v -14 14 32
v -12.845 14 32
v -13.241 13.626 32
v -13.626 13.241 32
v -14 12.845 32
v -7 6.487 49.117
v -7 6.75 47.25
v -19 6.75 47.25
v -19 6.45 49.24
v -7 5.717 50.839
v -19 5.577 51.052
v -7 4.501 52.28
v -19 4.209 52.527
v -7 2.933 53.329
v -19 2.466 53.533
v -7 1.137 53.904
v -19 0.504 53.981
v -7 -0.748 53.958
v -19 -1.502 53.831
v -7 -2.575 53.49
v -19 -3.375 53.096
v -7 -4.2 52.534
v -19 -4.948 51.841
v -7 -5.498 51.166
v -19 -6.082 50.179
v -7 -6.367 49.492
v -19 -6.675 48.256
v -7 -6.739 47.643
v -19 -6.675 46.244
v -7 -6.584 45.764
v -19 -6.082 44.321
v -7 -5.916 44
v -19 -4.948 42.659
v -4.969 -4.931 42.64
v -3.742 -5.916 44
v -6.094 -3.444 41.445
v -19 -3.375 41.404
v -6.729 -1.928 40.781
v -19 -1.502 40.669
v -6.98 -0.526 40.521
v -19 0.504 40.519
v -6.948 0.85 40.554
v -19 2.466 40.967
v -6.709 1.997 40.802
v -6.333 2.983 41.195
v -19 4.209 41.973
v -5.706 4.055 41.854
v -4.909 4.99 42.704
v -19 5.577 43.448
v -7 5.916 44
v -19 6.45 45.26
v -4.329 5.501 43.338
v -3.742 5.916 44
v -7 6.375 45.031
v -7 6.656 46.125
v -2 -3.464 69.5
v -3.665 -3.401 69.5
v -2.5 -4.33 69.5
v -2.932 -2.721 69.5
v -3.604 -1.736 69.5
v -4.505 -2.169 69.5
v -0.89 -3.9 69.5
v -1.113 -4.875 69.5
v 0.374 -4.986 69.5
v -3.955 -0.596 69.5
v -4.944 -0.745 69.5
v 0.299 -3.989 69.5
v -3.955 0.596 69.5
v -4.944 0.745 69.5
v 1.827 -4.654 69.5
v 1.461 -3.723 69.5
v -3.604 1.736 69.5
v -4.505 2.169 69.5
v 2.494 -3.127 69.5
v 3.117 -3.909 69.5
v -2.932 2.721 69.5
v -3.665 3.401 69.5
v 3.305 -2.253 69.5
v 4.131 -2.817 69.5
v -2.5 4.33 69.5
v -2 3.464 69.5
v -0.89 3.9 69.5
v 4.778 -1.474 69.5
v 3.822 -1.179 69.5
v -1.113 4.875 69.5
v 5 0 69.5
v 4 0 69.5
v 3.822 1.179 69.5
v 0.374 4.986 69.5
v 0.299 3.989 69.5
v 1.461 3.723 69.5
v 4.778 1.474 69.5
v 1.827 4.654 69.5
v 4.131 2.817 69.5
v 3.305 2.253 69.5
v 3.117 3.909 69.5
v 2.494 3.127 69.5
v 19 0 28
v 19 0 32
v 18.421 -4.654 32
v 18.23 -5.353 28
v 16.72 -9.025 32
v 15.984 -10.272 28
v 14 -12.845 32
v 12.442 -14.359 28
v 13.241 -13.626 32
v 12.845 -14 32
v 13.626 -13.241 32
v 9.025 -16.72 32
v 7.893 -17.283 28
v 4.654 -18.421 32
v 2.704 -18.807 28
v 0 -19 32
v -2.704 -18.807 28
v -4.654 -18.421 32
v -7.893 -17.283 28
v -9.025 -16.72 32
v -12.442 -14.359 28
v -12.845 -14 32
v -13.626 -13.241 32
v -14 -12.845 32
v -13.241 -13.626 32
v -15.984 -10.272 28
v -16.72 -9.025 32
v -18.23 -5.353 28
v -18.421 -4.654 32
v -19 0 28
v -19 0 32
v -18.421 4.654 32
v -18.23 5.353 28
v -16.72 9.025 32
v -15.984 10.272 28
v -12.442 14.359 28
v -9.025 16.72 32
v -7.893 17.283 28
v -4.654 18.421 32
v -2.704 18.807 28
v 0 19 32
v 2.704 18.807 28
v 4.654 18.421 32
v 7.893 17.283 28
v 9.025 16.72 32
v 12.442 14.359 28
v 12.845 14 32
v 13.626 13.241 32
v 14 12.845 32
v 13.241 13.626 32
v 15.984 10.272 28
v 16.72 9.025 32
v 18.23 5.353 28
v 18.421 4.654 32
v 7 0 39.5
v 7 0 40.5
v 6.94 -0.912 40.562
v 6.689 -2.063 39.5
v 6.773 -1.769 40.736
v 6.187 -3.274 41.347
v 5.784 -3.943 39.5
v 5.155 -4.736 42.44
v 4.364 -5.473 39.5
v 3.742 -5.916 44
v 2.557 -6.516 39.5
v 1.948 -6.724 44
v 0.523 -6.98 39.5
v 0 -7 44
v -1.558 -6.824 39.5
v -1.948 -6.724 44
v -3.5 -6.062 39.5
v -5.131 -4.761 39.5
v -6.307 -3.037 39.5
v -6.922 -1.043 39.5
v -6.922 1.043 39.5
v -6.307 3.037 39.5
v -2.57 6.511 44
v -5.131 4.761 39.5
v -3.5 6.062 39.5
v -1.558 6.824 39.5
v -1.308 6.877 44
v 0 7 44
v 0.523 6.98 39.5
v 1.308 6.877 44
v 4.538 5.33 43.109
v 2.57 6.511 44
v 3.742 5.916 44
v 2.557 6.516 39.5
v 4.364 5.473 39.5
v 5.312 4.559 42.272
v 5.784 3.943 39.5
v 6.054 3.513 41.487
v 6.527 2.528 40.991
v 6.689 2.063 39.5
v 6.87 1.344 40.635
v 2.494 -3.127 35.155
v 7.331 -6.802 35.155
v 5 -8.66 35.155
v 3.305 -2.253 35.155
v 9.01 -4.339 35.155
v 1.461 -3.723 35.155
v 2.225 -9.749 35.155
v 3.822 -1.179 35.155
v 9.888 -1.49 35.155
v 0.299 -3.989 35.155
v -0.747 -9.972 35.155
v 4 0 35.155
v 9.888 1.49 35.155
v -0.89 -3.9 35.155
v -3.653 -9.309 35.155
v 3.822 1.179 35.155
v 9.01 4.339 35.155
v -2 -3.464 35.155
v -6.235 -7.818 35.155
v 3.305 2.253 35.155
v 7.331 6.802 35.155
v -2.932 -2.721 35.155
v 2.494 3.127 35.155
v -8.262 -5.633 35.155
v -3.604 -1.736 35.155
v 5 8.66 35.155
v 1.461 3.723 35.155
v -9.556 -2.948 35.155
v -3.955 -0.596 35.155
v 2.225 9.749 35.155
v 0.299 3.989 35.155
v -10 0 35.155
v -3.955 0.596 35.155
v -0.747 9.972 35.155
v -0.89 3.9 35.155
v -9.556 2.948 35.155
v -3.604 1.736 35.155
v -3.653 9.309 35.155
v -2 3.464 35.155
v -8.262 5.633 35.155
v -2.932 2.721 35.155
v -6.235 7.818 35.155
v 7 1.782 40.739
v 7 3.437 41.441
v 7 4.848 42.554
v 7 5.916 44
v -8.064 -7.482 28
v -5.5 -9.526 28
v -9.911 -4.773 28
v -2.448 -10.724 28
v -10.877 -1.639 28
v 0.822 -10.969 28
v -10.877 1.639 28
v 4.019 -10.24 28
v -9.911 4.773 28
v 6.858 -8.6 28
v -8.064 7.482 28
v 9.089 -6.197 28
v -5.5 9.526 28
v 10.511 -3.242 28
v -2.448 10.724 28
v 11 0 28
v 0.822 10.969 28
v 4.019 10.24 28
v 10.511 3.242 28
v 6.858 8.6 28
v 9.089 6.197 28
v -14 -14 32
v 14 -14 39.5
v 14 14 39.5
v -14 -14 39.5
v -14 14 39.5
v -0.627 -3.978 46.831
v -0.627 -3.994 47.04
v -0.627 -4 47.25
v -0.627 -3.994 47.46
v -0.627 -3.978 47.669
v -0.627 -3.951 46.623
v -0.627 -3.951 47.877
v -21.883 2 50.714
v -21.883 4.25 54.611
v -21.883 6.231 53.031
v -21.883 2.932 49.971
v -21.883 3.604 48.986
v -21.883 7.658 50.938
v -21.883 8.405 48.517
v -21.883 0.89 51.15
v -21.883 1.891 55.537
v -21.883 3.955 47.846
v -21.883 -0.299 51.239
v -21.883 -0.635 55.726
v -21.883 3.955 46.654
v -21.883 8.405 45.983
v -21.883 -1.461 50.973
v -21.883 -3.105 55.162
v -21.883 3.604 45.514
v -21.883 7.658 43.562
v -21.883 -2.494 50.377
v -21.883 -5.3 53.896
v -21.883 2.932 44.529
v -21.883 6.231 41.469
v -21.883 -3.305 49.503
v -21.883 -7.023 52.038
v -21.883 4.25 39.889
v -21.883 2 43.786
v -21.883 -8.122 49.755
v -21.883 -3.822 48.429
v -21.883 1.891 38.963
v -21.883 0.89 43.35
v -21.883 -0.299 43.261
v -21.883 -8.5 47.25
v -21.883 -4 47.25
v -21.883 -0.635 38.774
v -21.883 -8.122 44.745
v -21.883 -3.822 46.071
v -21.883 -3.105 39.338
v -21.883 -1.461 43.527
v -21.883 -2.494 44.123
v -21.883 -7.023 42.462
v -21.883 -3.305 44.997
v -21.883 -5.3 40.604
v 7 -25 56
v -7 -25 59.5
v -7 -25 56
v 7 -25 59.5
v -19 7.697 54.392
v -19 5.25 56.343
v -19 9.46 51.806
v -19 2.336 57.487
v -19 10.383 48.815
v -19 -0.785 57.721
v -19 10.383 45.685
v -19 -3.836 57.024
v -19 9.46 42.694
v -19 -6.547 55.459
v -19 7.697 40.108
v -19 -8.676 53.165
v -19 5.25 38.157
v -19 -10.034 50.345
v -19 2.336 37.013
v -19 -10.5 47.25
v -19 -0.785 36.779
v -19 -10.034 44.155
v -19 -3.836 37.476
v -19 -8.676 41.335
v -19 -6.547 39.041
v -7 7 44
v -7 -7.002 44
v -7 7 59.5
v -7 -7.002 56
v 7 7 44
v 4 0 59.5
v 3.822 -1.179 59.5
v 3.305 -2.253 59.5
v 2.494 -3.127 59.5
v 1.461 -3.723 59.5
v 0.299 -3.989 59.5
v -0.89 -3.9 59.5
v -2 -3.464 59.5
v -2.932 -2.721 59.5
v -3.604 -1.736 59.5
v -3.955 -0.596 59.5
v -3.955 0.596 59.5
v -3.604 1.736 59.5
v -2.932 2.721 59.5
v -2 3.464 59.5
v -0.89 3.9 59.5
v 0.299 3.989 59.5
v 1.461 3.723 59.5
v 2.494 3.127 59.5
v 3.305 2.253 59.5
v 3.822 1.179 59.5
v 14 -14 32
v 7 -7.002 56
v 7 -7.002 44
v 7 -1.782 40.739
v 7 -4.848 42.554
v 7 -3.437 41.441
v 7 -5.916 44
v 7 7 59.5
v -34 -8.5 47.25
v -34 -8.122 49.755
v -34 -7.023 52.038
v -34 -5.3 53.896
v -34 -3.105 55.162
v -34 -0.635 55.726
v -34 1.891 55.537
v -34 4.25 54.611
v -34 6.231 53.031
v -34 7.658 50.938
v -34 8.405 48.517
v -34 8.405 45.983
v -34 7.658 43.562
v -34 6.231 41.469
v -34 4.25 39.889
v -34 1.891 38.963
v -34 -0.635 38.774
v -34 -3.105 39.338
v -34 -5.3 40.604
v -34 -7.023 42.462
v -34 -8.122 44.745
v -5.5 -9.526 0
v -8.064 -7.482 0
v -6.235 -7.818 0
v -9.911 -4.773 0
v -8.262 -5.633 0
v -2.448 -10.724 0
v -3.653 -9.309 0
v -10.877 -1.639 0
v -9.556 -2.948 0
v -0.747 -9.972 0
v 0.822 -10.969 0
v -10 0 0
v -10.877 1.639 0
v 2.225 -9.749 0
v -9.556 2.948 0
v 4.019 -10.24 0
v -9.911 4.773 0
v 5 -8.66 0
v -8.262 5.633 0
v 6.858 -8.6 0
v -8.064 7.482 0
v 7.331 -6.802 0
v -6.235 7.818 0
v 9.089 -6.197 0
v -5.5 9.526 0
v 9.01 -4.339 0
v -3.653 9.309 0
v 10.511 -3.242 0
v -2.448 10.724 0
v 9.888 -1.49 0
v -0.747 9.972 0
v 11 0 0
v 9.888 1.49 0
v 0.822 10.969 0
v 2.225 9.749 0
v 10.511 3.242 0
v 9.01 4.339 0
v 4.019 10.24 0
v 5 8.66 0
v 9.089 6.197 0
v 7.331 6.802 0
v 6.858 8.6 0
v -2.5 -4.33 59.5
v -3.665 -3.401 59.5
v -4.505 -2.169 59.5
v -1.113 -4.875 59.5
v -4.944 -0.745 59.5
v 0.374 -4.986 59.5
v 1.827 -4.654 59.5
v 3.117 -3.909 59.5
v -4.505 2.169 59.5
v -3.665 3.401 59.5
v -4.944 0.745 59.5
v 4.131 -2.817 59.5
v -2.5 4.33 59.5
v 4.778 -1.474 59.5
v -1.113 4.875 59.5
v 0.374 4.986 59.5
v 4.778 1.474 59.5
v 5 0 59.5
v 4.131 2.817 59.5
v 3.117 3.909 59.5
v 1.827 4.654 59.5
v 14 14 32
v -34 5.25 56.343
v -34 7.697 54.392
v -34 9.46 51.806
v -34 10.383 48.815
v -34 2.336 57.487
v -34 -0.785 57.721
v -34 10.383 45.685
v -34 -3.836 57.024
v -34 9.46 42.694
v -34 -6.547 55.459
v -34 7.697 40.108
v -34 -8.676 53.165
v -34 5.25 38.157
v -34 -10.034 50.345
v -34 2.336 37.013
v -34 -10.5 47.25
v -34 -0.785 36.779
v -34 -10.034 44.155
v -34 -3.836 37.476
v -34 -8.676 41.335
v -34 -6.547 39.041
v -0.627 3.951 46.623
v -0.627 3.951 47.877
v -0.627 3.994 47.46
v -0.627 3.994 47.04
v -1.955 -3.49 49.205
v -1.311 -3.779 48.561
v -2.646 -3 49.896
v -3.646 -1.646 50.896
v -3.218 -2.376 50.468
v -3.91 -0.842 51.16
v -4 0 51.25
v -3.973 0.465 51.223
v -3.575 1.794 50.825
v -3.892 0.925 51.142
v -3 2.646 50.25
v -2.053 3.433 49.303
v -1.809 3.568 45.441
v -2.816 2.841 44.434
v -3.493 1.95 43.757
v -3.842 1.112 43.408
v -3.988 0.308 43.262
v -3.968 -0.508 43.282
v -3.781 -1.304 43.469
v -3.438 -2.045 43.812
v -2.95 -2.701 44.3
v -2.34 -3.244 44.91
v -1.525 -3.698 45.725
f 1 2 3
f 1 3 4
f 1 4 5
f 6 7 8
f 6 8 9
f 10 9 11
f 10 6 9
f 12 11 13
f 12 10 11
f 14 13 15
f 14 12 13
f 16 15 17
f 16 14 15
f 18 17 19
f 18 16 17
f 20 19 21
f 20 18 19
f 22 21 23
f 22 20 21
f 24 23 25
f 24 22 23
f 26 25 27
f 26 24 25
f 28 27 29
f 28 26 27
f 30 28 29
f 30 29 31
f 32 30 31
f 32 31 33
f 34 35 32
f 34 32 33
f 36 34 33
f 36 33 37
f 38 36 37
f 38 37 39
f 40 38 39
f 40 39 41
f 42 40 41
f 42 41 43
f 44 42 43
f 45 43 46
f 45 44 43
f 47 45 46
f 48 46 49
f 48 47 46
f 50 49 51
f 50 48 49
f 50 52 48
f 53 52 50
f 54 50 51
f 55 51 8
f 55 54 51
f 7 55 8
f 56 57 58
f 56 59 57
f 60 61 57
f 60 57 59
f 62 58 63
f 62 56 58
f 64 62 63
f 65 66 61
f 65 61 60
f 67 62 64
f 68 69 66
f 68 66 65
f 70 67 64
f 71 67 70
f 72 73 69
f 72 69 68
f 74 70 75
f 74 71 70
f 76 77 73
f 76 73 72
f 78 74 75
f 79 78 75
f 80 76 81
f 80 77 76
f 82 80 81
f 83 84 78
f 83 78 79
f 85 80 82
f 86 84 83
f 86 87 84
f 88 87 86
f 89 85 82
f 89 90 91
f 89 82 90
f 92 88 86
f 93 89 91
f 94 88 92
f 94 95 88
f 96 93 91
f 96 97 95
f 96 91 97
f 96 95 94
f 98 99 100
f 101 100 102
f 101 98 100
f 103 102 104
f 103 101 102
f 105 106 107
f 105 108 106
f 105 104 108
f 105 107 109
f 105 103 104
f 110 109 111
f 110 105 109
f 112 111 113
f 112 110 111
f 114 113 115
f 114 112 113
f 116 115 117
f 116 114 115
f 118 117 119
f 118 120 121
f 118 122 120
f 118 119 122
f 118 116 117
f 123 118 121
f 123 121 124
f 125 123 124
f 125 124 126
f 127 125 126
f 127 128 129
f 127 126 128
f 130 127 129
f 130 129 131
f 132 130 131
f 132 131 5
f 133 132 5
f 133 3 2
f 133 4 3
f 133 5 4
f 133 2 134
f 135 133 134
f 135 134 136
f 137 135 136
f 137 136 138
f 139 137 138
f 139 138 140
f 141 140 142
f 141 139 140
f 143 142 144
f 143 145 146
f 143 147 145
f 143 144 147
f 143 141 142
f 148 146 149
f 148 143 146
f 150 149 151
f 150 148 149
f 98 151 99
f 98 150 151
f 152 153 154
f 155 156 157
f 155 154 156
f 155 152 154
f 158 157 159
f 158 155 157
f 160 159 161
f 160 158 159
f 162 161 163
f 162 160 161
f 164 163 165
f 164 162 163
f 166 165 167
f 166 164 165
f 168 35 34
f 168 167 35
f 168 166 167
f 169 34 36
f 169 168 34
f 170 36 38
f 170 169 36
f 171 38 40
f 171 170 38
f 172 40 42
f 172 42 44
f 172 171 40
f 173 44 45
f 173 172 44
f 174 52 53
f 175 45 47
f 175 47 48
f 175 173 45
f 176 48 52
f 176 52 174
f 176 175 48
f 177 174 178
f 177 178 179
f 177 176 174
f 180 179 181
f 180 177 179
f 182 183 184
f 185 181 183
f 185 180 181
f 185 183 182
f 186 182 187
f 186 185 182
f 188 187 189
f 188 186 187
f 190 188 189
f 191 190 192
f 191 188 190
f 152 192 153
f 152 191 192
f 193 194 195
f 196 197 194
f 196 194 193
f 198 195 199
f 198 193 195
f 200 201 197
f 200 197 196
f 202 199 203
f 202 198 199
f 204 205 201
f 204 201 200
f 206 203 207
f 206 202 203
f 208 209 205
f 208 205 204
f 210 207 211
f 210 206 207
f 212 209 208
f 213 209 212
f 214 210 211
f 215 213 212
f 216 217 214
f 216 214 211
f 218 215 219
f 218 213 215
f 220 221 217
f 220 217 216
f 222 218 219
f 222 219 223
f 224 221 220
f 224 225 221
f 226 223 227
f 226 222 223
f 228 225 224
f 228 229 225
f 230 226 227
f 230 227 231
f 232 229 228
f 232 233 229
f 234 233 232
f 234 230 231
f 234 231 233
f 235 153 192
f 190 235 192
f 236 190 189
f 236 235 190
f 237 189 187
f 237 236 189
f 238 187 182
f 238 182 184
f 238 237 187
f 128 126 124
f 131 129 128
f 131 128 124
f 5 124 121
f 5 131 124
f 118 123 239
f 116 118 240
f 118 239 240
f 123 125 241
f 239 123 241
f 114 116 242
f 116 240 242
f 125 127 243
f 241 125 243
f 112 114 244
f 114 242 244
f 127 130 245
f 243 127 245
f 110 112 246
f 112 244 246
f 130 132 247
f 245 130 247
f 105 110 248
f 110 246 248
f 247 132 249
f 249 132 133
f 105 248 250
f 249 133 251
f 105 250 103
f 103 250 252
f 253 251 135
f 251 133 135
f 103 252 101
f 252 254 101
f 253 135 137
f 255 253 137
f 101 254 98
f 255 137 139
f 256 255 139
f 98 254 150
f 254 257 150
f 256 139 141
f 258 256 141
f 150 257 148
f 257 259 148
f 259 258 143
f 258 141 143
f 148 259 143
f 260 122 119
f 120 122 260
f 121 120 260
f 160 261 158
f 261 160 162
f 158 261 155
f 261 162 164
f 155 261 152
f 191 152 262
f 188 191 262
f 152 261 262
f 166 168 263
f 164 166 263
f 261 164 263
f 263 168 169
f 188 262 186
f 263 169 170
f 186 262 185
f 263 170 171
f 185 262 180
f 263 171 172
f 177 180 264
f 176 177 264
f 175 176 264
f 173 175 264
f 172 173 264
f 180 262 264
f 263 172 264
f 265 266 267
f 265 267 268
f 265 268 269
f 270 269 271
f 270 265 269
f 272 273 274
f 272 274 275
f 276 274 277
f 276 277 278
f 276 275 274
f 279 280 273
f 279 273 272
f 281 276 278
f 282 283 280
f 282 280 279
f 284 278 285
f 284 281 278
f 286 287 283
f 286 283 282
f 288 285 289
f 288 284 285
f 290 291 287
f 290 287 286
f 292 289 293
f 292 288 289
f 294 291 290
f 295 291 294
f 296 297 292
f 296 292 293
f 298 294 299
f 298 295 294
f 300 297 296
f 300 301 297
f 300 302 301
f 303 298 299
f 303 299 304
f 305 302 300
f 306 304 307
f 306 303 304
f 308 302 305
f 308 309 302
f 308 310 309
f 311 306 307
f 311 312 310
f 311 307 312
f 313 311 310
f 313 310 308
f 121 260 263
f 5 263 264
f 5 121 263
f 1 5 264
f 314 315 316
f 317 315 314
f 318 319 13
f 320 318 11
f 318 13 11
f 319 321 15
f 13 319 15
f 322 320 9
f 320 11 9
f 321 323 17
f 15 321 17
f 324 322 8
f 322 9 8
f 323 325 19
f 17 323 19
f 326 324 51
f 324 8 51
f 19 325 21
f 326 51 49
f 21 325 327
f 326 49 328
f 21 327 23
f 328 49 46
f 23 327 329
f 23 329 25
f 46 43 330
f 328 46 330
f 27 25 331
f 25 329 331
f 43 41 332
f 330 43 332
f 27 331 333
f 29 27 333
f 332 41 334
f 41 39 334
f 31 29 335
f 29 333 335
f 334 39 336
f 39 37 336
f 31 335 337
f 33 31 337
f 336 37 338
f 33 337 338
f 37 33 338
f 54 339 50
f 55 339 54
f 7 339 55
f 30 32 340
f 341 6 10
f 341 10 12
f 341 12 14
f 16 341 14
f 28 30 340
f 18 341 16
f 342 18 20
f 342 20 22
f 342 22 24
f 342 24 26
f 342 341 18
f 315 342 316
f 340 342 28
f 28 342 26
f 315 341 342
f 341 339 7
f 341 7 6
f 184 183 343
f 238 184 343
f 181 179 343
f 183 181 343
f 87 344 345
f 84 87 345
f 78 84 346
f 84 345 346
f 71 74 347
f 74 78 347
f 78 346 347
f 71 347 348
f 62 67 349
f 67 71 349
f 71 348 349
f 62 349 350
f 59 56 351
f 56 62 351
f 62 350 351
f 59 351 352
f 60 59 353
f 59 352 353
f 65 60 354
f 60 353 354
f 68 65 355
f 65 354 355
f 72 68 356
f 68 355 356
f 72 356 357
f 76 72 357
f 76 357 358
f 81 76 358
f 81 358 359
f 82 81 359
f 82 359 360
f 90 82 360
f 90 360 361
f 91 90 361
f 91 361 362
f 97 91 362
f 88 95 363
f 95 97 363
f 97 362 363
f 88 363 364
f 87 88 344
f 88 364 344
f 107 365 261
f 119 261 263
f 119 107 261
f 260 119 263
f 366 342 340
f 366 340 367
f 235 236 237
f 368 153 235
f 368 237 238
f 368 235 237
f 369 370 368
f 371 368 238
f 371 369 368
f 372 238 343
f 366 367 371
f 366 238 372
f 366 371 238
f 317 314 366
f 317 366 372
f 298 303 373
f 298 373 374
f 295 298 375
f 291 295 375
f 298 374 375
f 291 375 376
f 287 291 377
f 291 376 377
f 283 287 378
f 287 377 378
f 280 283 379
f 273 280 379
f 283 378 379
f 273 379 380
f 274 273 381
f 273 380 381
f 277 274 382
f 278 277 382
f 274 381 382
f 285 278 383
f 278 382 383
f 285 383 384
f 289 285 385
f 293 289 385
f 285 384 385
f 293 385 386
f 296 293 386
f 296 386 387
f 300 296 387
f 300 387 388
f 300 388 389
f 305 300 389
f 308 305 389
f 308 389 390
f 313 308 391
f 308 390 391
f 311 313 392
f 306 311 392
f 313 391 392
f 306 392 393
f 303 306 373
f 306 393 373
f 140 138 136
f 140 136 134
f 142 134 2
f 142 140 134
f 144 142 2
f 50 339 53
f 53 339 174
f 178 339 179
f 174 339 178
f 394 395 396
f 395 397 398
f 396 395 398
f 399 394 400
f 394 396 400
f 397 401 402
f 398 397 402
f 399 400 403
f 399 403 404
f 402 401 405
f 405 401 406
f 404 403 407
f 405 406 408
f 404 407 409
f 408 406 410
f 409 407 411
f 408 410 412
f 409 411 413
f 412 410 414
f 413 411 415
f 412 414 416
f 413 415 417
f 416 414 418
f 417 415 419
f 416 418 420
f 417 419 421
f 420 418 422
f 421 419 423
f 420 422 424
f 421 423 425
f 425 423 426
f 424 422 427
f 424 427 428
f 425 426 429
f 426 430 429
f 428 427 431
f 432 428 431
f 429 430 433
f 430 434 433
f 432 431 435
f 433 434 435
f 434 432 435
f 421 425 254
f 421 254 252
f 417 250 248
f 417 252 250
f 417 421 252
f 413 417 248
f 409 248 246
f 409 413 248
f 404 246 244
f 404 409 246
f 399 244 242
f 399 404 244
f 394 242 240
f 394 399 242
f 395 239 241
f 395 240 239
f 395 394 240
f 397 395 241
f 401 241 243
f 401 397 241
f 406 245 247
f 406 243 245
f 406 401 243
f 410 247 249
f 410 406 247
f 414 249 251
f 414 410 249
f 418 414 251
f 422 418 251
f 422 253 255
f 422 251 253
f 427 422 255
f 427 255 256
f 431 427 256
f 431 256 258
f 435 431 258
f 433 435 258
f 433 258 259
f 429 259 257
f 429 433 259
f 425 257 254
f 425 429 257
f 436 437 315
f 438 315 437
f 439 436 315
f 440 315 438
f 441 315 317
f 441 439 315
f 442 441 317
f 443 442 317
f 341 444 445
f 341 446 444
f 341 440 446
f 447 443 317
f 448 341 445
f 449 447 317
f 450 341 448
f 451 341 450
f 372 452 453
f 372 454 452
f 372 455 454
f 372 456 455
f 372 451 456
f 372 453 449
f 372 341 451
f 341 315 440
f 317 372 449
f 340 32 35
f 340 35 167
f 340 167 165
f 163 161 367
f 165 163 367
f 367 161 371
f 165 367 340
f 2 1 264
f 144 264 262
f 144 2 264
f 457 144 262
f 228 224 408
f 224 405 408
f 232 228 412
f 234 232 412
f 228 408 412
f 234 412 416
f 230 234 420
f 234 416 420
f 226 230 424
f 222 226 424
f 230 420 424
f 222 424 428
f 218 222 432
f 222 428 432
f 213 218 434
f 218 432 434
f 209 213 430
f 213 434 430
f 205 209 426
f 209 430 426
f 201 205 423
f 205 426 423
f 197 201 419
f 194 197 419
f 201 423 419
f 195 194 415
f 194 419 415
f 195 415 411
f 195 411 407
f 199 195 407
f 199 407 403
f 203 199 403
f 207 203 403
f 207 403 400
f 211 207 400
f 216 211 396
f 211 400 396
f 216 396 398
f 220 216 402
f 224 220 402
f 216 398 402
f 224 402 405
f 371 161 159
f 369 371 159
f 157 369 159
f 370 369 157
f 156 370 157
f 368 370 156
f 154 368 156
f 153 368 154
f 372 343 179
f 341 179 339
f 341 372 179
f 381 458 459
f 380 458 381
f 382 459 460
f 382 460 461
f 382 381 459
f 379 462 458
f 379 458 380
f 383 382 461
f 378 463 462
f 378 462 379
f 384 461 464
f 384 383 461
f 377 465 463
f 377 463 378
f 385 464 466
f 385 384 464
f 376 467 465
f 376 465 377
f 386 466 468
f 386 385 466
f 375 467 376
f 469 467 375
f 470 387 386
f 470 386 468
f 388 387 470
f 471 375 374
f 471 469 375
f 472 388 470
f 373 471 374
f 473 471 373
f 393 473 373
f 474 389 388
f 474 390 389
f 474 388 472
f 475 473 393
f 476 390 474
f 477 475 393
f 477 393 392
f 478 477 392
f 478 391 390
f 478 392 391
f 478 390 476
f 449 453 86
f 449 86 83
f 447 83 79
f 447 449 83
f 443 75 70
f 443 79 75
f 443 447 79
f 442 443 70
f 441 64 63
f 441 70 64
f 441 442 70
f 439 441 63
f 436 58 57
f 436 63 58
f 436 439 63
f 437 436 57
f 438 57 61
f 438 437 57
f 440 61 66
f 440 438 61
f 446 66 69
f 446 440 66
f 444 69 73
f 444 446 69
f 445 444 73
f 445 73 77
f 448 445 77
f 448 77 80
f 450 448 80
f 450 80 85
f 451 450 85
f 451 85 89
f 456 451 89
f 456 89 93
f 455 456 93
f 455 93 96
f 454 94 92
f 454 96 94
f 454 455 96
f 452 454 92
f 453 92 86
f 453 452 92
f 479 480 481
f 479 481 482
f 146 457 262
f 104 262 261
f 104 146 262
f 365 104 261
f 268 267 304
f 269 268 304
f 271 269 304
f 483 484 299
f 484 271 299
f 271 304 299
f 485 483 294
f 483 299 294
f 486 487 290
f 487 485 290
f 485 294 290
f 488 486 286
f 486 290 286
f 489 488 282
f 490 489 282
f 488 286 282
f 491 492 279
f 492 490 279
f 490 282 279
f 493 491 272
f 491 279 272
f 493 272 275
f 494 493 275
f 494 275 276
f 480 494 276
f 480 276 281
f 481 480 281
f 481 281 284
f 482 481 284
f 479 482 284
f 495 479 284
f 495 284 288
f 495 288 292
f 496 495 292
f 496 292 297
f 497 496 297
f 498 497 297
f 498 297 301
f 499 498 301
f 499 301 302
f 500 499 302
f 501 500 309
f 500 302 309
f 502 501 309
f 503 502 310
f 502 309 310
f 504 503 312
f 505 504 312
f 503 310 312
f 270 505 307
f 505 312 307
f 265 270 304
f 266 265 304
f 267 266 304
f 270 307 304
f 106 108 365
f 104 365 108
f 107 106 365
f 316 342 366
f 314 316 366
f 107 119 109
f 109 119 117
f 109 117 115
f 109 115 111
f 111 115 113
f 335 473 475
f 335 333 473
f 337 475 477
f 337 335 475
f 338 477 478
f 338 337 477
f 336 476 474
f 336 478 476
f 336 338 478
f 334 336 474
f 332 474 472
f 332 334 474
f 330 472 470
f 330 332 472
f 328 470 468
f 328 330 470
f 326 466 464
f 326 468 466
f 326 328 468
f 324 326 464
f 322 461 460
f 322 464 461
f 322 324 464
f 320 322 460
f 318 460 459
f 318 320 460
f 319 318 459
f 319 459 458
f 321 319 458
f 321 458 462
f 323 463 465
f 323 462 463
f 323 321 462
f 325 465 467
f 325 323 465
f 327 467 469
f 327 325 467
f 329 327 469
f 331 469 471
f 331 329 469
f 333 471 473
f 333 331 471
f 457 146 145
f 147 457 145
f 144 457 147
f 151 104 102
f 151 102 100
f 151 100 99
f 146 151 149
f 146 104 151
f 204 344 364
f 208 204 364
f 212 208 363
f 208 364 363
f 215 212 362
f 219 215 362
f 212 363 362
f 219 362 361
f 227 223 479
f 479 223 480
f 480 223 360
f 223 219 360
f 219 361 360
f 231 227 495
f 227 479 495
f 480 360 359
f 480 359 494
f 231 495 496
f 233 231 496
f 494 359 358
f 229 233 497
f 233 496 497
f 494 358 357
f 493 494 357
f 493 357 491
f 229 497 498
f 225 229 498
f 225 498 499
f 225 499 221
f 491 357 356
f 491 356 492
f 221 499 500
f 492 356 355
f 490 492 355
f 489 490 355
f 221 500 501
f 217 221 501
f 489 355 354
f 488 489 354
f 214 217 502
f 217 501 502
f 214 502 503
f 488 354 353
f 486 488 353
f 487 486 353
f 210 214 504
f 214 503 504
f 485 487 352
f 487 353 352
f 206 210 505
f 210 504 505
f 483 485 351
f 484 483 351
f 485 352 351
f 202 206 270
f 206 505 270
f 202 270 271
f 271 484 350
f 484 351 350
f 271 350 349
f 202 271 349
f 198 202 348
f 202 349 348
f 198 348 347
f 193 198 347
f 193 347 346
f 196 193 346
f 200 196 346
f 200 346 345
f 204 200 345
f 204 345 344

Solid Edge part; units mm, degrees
sketch "Sketch1" plane through (0, 0, 0) normal (0, 0, 1) x (1, 0, 0)
  circle A0 centre (0, 0) radius 11
extrude "Protrusion1" add sketch "Sketch1" along normal blind 28
sketch "Sketch2" plane through (0, 0, 28) normal (0, 0, 1) x (1, 0, 0)
  circle A0 centre (0, 0) radius 19
extrude "ExtrudedProtrusion_2" add sketch "Sketch2" along normal blind 4
sketch "Sketch3" plane through (0, 0, 32) normal (0, 0, 1) x (1, 0, 0)
  line L0 (14, 14) -> (14, -14)
  line L1 (14, -14) -> (-14, -14)
  line L2 (-14, -14) -> (-14, 14)
  line L3 (-14, 14) -> (14, 14)
extrude "ExtrudedProtrusion_3" add sketch "Sketch3" along normal blind 7.5
sketch "Sketch4" plane through (0, 0, 39.5) normal (0, 0, 1) x (1, 0, 0)
  circle A0 centre (0, 0) radius 7
extrude "ExtrudedProtrusion_4" add sketch "Sketch4" along normal blind 20
sketch "Sketch5" plane through (0, 0, 59.5) normal (0, 0, 1) x (1, 0, 0)
  line L0 (7, -25) -> (7, 7)
  line L1 (7, 7) -> (-7, 7)
  line L2 (-7, 7) -> (-7, -25)
  line L3 (-7, -25) -> (7, -25)
extrude "ExtrudedProtrusion_5" add sketch "Sketch5" against normal blind 3.5
sketch "Sketch6" plane through (0, -9, 59.5) normal (0, 0, 1) x (1, 0, 0)
  circle A0 centre (0, 9) radius 5
  circle A1 centre (0, 9) radius 4
extrude "ExtrudedProtrusion_6" add sketch "Sketch6" along normal blind 10
sketch "Sketch7" plane through (0, -12.5, 56) normal (0, 0, -1) x (0, -1, 0)
  line L0 (-5.4984, 7) -> (-5.4984, -7)
  line L1 (-5.4984, -7) -> (-19.5, -7)
  line L2 (-19.5, -7) -> (-19.5, 7)
  line L3 (-19.5, 7) -> (-5.4984, 7)
extrude "Protrusion2" add sketch "Sketch7" along normal blind 12
sketch "Sketch8" plane through (7, -9, 51.75) normal (1, 0, 0) x (0, 1, 0)
  circle A0 centre (9, -4.5) radius 6.75
extrude "ExtrudedProtrusion_10" add sketch "Sketch8" against normal blind 26
sketch "Sketch9" plane through (-19, 0, 47.25) normal (-1, 0, 0) x (0, -1, 0)
  circle A0 centre (0, 0) radius 10.5
extrude "ExtrudedProtrusion_11" add sketch "Sketch9" along normal blind 15
sketch "Sketch10" plane through (-34, 0, 47.25) normal (-1, 0, 0) x (0, -1, 0)
  circle A0 centre (0, 0) radius 8.5
extrude "ExtrudedCutout_1" cut sketch "Sketch10" against normal blind 12.1174
sketch "Sketch11" plane through (0, 0, 0) normal (0, 0, -1) x (-1, 0, 0)
  circle A0 centre (0, 0) radius 10
extrude "ExtrudedCutout_2" cut sketch "Sketch11" against normal blind 35.1549
sketch "Sketch12" plane through (0, -9, 59.5) normal (0, 0, 1) x (1, 0, 0)
  circle A0 centre (0, 9) radius 4
extrude "Cutout1" cut sketch "Sketch12" against normal blind 106.077
sketch "Sketch13" plane through (-21.8826, 0, 47.25) normal (-1, 0, 0) x (0, -1, 0)
  circle A0 centre (0, 0) radius 4
extrude "ExtrudedCutout_4" cut sketch "Sketch13" against normal blind 21.2558
